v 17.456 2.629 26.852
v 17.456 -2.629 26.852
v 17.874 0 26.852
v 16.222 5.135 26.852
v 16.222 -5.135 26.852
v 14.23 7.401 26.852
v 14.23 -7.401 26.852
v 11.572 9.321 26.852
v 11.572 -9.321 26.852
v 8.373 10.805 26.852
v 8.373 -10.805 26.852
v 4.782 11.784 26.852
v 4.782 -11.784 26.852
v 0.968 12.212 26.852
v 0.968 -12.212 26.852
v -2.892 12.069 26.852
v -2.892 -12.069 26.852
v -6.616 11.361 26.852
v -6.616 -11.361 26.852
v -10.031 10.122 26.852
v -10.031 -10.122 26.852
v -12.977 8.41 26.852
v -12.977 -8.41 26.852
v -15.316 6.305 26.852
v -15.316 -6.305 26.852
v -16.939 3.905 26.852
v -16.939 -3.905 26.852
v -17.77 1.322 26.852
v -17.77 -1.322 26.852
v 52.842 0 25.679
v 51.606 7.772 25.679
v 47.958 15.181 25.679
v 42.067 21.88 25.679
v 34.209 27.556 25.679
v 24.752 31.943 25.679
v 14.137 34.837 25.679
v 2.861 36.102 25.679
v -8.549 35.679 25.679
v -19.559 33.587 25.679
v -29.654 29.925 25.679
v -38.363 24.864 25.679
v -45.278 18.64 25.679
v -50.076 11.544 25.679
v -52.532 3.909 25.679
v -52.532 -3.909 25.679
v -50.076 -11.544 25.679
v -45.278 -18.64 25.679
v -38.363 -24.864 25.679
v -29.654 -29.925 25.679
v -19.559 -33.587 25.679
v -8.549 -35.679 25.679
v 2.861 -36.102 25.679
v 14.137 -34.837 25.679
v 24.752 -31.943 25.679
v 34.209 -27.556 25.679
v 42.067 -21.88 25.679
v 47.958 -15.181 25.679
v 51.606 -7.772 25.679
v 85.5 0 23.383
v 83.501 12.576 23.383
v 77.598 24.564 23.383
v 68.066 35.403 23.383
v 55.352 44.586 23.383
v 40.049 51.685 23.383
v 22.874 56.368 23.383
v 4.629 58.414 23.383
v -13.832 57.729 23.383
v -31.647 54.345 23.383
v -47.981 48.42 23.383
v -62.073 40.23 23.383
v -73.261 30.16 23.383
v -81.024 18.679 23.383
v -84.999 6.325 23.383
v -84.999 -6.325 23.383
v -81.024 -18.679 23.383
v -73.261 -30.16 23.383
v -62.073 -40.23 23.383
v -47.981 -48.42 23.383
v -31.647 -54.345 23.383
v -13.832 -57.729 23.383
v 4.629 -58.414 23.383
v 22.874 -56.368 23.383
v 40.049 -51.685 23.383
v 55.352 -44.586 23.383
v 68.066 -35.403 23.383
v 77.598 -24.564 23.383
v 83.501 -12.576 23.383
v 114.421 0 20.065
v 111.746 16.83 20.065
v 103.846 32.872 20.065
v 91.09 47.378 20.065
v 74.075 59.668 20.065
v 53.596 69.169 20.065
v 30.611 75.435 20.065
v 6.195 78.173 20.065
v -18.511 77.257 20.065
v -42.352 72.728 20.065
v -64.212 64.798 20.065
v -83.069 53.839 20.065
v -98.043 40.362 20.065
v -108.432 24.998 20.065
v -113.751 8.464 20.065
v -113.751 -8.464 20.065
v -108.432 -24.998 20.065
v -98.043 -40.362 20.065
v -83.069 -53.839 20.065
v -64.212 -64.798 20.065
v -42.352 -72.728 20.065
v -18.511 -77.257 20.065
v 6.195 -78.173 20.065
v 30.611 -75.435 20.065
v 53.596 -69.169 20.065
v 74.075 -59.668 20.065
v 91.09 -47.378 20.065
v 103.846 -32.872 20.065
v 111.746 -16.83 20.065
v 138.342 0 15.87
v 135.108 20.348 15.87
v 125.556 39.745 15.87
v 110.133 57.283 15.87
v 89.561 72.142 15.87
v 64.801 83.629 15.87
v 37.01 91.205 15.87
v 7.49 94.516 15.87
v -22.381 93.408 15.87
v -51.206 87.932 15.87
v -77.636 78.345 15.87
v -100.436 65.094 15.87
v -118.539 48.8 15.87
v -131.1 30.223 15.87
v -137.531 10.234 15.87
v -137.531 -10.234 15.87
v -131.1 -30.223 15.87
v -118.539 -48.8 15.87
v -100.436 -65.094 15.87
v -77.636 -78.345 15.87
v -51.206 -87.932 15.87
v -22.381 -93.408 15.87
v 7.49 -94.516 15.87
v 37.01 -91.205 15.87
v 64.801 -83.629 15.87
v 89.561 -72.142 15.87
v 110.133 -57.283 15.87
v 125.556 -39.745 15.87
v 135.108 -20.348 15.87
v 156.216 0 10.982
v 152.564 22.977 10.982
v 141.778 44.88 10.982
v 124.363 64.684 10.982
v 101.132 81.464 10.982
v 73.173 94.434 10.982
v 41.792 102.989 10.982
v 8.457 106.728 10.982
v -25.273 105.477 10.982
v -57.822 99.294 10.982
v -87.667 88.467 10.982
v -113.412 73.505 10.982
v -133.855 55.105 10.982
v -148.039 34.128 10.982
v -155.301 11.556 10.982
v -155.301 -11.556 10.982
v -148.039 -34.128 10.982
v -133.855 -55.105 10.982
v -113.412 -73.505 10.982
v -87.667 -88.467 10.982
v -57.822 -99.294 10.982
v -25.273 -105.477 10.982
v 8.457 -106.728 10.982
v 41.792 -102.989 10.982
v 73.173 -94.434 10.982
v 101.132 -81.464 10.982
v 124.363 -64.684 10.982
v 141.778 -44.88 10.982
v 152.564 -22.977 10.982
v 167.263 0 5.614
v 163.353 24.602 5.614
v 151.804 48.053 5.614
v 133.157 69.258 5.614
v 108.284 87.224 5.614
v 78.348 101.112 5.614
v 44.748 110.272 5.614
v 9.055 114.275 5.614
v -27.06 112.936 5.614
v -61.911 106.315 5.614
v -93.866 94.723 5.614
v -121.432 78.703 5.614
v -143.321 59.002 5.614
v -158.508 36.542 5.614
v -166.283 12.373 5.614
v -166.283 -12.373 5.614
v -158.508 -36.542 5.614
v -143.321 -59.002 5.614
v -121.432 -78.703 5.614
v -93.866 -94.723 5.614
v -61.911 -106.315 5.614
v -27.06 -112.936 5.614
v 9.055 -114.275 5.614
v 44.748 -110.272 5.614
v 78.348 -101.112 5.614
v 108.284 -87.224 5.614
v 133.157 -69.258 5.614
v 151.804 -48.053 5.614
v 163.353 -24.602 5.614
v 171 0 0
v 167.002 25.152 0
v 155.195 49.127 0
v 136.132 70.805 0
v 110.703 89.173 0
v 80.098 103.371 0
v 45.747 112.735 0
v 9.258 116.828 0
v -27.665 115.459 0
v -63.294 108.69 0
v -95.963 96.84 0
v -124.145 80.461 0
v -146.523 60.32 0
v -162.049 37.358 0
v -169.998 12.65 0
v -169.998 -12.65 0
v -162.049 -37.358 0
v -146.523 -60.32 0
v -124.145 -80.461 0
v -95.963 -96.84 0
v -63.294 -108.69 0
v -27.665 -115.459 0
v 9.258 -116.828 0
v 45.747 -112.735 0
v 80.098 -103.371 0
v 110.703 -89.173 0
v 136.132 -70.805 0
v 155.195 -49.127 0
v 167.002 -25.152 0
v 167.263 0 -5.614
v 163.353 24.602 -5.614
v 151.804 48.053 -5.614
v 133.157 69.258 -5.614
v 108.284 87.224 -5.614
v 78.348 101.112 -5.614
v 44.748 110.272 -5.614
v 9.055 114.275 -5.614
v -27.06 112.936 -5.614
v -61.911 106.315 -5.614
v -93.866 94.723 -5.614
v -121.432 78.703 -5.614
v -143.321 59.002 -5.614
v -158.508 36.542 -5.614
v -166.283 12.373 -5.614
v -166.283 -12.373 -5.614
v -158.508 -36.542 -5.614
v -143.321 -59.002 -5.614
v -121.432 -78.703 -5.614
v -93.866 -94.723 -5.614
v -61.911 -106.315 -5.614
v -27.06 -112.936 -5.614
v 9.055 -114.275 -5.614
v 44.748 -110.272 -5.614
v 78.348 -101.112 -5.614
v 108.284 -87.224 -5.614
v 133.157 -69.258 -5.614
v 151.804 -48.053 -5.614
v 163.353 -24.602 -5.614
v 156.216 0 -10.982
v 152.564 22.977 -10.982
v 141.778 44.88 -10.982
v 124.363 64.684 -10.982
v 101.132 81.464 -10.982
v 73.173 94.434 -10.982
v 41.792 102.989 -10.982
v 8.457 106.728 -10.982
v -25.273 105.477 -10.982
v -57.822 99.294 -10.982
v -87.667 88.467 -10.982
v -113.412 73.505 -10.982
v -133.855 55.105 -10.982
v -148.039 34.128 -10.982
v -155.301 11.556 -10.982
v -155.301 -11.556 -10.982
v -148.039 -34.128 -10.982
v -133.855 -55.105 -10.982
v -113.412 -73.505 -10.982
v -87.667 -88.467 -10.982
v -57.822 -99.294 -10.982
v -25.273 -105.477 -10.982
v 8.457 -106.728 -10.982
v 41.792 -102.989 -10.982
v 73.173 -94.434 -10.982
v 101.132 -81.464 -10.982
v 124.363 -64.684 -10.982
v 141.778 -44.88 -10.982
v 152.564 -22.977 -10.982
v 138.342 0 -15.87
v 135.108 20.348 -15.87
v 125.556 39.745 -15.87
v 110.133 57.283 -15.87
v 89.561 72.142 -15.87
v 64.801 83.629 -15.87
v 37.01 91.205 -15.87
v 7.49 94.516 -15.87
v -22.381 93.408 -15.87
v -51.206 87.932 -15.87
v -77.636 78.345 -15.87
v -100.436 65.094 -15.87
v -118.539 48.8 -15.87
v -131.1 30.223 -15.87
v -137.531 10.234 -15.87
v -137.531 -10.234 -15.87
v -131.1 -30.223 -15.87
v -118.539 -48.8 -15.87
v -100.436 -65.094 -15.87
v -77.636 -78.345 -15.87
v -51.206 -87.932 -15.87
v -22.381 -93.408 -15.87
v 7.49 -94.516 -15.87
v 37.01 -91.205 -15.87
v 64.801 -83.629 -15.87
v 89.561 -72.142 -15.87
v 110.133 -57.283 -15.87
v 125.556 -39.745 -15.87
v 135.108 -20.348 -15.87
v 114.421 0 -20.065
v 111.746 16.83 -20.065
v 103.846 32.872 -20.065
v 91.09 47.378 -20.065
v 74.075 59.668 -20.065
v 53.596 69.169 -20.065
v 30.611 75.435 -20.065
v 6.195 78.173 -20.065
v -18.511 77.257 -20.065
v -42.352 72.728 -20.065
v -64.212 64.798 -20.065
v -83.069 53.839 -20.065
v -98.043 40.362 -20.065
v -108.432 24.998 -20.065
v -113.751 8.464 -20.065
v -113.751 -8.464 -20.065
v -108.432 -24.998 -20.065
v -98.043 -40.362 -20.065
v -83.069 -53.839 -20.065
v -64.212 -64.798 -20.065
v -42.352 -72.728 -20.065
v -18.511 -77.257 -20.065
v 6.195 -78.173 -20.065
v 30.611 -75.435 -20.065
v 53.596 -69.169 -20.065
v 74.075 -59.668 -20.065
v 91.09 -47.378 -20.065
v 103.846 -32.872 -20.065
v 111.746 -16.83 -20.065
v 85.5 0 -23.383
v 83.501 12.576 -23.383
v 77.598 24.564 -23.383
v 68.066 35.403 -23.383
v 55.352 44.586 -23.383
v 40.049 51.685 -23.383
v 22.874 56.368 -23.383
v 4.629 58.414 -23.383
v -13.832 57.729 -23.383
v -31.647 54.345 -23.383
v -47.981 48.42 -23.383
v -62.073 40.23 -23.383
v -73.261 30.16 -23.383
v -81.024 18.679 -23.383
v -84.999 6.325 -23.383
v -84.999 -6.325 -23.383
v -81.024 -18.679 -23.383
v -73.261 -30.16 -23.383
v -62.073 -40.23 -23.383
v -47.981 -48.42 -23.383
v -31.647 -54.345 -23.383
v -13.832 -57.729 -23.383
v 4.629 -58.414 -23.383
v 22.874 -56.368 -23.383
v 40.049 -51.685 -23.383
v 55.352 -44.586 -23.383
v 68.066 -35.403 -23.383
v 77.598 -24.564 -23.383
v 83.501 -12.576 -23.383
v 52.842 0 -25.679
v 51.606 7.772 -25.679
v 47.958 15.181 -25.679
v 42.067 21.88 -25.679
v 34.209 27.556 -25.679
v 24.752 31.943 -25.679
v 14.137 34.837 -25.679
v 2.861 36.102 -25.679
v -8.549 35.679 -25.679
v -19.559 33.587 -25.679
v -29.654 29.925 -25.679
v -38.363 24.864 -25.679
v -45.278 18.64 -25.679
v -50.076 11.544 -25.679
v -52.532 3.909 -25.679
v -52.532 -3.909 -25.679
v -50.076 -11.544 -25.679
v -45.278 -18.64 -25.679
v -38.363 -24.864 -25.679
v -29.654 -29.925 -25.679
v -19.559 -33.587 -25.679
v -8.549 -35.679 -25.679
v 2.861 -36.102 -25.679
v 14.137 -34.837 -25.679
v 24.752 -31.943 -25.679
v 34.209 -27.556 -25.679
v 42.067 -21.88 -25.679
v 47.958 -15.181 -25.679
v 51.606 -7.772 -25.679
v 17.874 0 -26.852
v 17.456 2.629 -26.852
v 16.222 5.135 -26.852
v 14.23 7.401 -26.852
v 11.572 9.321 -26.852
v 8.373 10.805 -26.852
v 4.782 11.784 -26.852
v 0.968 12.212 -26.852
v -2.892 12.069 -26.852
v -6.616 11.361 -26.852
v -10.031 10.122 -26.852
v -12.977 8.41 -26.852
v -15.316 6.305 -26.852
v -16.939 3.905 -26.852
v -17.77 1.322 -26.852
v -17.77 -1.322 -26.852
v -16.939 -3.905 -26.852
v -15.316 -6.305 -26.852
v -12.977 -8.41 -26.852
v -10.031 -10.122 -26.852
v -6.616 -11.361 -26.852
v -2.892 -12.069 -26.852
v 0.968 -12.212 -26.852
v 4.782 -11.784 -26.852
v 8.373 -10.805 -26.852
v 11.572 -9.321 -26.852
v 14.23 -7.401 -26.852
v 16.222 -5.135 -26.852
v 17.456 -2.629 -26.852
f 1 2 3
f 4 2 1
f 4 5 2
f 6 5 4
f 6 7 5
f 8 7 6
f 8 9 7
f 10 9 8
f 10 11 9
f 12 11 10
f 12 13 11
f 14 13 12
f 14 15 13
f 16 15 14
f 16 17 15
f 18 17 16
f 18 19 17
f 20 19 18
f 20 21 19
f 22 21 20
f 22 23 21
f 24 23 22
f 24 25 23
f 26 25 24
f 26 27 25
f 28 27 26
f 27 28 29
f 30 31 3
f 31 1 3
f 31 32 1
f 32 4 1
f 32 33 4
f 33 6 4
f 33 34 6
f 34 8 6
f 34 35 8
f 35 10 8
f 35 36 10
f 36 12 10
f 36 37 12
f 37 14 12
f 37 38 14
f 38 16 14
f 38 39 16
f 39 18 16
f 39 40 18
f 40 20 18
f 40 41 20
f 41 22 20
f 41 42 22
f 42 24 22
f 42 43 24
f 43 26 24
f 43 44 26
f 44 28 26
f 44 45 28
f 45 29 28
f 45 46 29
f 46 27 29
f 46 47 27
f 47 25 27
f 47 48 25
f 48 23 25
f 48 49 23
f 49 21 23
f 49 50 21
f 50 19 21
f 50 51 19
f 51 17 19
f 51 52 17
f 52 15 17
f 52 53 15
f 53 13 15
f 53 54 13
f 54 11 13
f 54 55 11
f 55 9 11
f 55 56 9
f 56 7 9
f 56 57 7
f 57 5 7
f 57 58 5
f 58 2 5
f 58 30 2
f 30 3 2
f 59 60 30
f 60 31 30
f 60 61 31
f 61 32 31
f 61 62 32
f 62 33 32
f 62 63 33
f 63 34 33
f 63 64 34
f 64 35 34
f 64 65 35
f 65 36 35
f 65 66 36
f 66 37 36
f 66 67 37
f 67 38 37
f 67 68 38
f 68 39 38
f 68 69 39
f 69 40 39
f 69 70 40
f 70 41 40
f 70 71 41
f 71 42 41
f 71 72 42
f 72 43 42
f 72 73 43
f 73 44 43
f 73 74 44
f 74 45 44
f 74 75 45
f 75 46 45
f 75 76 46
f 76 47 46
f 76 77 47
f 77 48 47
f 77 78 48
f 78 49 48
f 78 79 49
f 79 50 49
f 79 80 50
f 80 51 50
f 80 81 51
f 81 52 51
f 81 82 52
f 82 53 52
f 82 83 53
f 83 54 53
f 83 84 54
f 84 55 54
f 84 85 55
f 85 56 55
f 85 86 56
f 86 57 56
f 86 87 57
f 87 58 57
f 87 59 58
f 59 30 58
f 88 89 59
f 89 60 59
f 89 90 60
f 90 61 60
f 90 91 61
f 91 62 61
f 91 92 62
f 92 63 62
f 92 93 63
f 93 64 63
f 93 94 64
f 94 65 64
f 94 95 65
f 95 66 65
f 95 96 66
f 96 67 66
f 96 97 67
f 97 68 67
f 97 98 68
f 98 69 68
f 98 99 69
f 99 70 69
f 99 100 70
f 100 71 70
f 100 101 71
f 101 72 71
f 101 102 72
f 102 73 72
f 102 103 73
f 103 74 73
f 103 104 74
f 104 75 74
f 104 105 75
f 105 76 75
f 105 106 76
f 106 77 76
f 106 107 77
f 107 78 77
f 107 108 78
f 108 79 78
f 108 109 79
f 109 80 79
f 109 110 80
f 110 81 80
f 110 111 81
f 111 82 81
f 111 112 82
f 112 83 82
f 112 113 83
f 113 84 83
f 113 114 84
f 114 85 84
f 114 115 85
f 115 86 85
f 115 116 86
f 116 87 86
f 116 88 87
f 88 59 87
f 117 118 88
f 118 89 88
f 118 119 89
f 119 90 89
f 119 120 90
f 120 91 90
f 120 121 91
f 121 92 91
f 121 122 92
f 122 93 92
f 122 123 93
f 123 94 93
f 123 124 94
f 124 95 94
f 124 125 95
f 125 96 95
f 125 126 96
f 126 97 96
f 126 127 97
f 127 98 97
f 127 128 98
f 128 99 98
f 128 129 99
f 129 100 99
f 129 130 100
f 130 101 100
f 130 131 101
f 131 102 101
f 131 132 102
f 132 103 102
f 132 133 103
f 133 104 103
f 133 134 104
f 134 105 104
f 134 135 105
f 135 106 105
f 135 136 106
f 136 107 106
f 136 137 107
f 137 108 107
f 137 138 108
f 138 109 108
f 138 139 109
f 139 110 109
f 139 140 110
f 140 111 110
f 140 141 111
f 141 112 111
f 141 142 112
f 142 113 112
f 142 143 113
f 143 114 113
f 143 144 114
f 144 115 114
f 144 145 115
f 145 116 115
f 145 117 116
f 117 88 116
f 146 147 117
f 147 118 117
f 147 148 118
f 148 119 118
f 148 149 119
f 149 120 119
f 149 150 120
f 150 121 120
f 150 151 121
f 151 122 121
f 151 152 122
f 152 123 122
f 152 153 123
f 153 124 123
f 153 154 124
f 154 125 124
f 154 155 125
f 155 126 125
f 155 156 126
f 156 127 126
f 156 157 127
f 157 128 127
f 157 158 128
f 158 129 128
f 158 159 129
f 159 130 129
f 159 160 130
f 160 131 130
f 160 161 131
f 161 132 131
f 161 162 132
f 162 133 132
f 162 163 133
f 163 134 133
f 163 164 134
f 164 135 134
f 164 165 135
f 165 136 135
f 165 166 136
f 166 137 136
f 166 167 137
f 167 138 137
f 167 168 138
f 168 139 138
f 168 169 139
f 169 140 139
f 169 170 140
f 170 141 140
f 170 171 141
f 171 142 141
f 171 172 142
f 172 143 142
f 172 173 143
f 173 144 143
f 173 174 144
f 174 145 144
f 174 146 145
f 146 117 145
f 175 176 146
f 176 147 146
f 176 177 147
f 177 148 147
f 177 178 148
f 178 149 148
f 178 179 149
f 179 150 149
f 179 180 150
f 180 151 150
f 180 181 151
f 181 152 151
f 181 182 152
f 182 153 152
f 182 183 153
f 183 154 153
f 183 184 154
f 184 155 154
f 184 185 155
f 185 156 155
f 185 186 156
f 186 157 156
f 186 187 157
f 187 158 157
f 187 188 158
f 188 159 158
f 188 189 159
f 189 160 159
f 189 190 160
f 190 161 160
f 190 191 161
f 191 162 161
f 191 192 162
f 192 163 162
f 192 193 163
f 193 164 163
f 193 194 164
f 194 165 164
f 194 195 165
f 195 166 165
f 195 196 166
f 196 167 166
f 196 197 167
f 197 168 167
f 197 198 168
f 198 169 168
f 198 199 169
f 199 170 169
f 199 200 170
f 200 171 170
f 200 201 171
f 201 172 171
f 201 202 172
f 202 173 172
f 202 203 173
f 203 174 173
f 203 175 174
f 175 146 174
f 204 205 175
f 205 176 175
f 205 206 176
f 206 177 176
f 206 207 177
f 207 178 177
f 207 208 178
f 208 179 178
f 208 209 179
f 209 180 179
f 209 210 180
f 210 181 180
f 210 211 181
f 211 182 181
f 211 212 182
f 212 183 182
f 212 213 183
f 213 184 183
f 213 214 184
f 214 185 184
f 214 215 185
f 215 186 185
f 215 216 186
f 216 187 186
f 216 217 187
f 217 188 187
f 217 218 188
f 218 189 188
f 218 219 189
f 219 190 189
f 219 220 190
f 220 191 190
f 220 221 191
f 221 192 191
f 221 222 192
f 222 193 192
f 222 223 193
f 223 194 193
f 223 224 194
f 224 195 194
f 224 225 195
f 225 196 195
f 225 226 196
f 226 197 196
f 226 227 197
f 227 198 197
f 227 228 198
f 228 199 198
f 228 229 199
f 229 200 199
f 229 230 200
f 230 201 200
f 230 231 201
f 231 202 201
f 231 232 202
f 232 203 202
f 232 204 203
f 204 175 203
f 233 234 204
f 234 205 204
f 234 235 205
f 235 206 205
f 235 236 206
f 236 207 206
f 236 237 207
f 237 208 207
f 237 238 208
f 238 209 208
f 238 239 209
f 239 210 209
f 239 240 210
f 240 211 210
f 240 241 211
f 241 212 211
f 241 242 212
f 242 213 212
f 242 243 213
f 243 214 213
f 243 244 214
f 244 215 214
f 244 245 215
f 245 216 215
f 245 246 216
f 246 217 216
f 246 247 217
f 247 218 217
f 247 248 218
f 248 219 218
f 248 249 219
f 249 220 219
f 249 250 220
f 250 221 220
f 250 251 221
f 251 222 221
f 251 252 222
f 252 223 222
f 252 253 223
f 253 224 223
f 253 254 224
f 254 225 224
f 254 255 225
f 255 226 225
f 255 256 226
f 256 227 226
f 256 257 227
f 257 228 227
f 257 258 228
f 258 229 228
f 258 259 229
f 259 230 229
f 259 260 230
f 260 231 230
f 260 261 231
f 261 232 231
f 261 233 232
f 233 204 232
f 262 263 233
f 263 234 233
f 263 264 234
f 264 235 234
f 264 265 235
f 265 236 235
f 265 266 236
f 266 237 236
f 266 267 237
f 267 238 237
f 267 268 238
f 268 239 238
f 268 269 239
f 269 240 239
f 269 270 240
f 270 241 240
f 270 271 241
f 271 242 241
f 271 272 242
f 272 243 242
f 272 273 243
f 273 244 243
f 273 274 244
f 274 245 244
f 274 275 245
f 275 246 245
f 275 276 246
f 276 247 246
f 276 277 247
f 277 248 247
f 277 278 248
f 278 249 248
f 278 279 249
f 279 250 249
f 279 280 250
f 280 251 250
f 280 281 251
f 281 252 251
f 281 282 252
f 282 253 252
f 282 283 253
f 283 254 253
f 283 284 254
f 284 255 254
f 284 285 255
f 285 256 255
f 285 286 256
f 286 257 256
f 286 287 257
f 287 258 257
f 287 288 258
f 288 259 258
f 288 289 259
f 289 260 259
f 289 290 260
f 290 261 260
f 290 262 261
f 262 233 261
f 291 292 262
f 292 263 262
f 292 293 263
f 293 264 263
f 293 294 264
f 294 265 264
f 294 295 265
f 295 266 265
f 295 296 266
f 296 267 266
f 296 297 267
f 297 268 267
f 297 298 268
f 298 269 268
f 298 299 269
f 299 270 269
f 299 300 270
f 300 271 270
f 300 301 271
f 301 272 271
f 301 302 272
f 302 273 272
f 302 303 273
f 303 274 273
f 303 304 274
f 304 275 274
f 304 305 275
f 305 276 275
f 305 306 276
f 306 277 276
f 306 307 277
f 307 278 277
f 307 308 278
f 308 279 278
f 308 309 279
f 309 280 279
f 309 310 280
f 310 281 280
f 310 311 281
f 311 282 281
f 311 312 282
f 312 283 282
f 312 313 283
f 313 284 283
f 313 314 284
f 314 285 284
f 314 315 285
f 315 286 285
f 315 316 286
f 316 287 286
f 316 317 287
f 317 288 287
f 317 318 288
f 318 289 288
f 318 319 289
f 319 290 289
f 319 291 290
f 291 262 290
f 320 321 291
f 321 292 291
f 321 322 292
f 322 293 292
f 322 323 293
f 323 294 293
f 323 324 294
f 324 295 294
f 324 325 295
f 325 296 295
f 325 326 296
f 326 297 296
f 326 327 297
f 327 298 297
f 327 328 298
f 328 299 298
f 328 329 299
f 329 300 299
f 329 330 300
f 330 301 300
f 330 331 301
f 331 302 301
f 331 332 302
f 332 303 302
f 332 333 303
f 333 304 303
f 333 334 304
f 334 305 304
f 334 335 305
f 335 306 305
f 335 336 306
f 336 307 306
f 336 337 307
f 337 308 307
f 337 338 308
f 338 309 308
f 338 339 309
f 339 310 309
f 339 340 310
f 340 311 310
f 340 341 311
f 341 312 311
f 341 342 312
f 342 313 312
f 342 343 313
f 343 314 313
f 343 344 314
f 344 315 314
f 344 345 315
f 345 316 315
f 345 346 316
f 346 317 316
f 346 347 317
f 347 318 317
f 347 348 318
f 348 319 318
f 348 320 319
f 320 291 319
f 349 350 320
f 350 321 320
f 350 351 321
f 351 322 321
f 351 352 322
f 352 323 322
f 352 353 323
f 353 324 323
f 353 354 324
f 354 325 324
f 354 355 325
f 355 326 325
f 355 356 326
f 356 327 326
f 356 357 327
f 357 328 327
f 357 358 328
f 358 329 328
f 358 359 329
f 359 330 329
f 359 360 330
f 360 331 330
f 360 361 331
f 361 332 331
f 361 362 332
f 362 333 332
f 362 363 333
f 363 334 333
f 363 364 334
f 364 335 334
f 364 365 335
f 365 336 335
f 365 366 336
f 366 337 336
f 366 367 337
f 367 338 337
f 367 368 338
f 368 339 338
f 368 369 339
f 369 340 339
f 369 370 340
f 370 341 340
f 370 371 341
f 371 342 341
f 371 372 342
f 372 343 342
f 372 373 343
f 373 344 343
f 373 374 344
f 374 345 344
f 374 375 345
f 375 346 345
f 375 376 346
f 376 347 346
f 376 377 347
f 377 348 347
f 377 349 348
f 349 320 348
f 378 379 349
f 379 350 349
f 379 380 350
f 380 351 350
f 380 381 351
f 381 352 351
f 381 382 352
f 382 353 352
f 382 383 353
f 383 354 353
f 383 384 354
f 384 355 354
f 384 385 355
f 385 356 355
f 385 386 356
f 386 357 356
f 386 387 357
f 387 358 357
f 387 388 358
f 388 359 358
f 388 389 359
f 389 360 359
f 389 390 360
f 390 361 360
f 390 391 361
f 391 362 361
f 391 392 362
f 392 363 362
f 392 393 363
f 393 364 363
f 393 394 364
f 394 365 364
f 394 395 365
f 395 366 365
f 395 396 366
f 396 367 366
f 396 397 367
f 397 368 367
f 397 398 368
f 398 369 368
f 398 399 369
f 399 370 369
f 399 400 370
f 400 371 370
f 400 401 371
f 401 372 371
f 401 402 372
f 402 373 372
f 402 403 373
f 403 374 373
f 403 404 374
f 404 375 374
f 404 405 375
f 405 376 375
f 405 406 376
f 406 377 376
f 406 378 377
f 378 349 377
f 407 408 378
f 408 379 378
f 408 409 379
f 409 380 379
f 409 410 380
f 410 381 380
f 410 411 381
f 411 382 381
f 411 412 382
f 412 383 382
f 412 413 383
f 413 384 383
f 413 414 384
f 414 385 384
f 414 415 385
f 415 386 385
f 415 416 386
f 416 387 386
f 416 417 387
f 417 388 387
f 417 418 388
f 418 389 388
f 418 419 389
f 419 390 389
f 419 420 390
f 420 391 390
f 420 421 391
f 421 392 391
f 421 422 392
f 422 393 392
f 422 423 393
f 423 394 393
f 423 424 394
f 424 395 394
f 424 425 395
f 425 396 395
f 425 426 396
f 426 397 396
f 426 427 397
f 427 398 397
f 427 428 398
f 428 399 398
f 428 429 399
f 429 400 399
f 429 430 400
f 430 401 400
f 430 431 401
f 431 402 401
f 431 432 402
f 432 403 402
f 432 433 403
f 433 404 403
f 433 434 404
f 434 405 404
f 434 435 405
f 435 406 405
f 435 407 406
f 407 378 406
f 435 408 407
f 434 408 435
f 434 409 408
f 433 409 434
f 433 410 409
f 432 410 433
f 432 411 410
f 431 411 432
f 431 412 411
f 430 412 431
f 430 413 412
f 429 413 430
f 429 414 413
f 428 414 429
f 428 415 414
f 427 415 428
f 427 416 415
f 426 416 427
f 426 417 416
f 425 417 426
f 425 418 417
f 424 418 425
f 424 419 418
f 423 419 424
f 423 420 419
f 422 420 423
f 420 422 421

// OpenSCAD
// Generated by SolidPython 1.0.1 on 2020-07-29 00:46:54


scale(v = [19, 13, 3]) {
	sphere(r = 9);
}
/***********************************************
*********      SolidPython code:      **********
************************************************
 
# import packages: SolidPython
from solid import *
from solid.utils import *
from itertools import chain, combinations, permutations


class Resize:

    def __init__(self, scad_file):
        self.scad_file = scad_file
        #self.scad_file = import_scad(scad_file)
        # cone/cylinder param:
        self.r1 = 0
        self.r2 = 0
        self.h = 0
        # rectangular prism param:
        self.w = 0
        self.l = 0
        # ellipse param:
        self.r = 0

    # import OpenScad code (file name corresponds to shape)


    # classify shape + parameters
    def assign(self, param1, param2, param3):
        if self.scad_file == 'cone.scad':
            self.r1 = param1
            self.r2 = param2
            self.h = param3
        elif self.scad_file == 'cylinder.scad':
            self.r1 = param1
            self.r2 = param2
            self.h = param3
        elif self.scad_file == 'rectangularPrism.scad':
            self.h = param1
            self.l = param2
            self.w = param3
        else:
            self.r = param1
            self.h = param2

    # resize parameters
    def iterate(self):
        x = range(3, 20, 2)
        i = 1
        if self.scad_file == 'cone.scad':
            tempList = list(permutations(x, 2))
            for temp in tempList:
                param1 = temp[0]
                param2 = temp[1]
                filepath = 'produced_scad_files/' + 'cone' + str(param1) + '_' + str(param2) + '_' + '.scad'
                scad_render_to_file(cylinder(h=param1, r1=param2, r2=0), filepath)

        elif self.scad_file == 'cylinder.scad':
            tempList = list(permutations(x, 3))
            for temp in tempList:
                param1 = temp[0]
                param2 = temp[1]
                filepath = 'produced_scad_files/' + 'cylinder' + str(param1) + '_' + str(param2) + '_' + '.scad'
                scad_render_to_file(cylinder(h=param1, r1=param2, r2=param2), filepath)

        elif self.scad_file == 'rectangularPrism.scad':
            tempList = list(permutations(x, 3))
            for temp in tempList:
                param1 = temp[0]
                param2 = temp[1]
                param3 = temp[2]
                filepath = 'produced_scad_files/' + 'rectangularPrism' + str(param1) + '_' + str(param2) + '_' + str(
                    param3) + '.scad'
                scad_render_to_file(cube(size=(param1, param2, param3)), filepath)

        elif self.scad_file == 'ellipse.scad':
            tempList = list(permutations(x, 4))
            for temp in tempList:
                param1 = temp[0]
                param2 = temp[1]
                param3 = temp[2]
                param4 = temp[3]
                filepath = 'produced_scad_files/' + 'ellipse' + str(param1) + '_' + str(param2) + '_' + str(param3) + '_' + str(param4) + '.scad'
                scad_render_to_file(scale([param1, param2, param3])(sphere(r=param4)), filepath)

    def render_to_scadfile(self):
        scad_render_to_file(scad, 'example.scad') 
 
************************************************/
